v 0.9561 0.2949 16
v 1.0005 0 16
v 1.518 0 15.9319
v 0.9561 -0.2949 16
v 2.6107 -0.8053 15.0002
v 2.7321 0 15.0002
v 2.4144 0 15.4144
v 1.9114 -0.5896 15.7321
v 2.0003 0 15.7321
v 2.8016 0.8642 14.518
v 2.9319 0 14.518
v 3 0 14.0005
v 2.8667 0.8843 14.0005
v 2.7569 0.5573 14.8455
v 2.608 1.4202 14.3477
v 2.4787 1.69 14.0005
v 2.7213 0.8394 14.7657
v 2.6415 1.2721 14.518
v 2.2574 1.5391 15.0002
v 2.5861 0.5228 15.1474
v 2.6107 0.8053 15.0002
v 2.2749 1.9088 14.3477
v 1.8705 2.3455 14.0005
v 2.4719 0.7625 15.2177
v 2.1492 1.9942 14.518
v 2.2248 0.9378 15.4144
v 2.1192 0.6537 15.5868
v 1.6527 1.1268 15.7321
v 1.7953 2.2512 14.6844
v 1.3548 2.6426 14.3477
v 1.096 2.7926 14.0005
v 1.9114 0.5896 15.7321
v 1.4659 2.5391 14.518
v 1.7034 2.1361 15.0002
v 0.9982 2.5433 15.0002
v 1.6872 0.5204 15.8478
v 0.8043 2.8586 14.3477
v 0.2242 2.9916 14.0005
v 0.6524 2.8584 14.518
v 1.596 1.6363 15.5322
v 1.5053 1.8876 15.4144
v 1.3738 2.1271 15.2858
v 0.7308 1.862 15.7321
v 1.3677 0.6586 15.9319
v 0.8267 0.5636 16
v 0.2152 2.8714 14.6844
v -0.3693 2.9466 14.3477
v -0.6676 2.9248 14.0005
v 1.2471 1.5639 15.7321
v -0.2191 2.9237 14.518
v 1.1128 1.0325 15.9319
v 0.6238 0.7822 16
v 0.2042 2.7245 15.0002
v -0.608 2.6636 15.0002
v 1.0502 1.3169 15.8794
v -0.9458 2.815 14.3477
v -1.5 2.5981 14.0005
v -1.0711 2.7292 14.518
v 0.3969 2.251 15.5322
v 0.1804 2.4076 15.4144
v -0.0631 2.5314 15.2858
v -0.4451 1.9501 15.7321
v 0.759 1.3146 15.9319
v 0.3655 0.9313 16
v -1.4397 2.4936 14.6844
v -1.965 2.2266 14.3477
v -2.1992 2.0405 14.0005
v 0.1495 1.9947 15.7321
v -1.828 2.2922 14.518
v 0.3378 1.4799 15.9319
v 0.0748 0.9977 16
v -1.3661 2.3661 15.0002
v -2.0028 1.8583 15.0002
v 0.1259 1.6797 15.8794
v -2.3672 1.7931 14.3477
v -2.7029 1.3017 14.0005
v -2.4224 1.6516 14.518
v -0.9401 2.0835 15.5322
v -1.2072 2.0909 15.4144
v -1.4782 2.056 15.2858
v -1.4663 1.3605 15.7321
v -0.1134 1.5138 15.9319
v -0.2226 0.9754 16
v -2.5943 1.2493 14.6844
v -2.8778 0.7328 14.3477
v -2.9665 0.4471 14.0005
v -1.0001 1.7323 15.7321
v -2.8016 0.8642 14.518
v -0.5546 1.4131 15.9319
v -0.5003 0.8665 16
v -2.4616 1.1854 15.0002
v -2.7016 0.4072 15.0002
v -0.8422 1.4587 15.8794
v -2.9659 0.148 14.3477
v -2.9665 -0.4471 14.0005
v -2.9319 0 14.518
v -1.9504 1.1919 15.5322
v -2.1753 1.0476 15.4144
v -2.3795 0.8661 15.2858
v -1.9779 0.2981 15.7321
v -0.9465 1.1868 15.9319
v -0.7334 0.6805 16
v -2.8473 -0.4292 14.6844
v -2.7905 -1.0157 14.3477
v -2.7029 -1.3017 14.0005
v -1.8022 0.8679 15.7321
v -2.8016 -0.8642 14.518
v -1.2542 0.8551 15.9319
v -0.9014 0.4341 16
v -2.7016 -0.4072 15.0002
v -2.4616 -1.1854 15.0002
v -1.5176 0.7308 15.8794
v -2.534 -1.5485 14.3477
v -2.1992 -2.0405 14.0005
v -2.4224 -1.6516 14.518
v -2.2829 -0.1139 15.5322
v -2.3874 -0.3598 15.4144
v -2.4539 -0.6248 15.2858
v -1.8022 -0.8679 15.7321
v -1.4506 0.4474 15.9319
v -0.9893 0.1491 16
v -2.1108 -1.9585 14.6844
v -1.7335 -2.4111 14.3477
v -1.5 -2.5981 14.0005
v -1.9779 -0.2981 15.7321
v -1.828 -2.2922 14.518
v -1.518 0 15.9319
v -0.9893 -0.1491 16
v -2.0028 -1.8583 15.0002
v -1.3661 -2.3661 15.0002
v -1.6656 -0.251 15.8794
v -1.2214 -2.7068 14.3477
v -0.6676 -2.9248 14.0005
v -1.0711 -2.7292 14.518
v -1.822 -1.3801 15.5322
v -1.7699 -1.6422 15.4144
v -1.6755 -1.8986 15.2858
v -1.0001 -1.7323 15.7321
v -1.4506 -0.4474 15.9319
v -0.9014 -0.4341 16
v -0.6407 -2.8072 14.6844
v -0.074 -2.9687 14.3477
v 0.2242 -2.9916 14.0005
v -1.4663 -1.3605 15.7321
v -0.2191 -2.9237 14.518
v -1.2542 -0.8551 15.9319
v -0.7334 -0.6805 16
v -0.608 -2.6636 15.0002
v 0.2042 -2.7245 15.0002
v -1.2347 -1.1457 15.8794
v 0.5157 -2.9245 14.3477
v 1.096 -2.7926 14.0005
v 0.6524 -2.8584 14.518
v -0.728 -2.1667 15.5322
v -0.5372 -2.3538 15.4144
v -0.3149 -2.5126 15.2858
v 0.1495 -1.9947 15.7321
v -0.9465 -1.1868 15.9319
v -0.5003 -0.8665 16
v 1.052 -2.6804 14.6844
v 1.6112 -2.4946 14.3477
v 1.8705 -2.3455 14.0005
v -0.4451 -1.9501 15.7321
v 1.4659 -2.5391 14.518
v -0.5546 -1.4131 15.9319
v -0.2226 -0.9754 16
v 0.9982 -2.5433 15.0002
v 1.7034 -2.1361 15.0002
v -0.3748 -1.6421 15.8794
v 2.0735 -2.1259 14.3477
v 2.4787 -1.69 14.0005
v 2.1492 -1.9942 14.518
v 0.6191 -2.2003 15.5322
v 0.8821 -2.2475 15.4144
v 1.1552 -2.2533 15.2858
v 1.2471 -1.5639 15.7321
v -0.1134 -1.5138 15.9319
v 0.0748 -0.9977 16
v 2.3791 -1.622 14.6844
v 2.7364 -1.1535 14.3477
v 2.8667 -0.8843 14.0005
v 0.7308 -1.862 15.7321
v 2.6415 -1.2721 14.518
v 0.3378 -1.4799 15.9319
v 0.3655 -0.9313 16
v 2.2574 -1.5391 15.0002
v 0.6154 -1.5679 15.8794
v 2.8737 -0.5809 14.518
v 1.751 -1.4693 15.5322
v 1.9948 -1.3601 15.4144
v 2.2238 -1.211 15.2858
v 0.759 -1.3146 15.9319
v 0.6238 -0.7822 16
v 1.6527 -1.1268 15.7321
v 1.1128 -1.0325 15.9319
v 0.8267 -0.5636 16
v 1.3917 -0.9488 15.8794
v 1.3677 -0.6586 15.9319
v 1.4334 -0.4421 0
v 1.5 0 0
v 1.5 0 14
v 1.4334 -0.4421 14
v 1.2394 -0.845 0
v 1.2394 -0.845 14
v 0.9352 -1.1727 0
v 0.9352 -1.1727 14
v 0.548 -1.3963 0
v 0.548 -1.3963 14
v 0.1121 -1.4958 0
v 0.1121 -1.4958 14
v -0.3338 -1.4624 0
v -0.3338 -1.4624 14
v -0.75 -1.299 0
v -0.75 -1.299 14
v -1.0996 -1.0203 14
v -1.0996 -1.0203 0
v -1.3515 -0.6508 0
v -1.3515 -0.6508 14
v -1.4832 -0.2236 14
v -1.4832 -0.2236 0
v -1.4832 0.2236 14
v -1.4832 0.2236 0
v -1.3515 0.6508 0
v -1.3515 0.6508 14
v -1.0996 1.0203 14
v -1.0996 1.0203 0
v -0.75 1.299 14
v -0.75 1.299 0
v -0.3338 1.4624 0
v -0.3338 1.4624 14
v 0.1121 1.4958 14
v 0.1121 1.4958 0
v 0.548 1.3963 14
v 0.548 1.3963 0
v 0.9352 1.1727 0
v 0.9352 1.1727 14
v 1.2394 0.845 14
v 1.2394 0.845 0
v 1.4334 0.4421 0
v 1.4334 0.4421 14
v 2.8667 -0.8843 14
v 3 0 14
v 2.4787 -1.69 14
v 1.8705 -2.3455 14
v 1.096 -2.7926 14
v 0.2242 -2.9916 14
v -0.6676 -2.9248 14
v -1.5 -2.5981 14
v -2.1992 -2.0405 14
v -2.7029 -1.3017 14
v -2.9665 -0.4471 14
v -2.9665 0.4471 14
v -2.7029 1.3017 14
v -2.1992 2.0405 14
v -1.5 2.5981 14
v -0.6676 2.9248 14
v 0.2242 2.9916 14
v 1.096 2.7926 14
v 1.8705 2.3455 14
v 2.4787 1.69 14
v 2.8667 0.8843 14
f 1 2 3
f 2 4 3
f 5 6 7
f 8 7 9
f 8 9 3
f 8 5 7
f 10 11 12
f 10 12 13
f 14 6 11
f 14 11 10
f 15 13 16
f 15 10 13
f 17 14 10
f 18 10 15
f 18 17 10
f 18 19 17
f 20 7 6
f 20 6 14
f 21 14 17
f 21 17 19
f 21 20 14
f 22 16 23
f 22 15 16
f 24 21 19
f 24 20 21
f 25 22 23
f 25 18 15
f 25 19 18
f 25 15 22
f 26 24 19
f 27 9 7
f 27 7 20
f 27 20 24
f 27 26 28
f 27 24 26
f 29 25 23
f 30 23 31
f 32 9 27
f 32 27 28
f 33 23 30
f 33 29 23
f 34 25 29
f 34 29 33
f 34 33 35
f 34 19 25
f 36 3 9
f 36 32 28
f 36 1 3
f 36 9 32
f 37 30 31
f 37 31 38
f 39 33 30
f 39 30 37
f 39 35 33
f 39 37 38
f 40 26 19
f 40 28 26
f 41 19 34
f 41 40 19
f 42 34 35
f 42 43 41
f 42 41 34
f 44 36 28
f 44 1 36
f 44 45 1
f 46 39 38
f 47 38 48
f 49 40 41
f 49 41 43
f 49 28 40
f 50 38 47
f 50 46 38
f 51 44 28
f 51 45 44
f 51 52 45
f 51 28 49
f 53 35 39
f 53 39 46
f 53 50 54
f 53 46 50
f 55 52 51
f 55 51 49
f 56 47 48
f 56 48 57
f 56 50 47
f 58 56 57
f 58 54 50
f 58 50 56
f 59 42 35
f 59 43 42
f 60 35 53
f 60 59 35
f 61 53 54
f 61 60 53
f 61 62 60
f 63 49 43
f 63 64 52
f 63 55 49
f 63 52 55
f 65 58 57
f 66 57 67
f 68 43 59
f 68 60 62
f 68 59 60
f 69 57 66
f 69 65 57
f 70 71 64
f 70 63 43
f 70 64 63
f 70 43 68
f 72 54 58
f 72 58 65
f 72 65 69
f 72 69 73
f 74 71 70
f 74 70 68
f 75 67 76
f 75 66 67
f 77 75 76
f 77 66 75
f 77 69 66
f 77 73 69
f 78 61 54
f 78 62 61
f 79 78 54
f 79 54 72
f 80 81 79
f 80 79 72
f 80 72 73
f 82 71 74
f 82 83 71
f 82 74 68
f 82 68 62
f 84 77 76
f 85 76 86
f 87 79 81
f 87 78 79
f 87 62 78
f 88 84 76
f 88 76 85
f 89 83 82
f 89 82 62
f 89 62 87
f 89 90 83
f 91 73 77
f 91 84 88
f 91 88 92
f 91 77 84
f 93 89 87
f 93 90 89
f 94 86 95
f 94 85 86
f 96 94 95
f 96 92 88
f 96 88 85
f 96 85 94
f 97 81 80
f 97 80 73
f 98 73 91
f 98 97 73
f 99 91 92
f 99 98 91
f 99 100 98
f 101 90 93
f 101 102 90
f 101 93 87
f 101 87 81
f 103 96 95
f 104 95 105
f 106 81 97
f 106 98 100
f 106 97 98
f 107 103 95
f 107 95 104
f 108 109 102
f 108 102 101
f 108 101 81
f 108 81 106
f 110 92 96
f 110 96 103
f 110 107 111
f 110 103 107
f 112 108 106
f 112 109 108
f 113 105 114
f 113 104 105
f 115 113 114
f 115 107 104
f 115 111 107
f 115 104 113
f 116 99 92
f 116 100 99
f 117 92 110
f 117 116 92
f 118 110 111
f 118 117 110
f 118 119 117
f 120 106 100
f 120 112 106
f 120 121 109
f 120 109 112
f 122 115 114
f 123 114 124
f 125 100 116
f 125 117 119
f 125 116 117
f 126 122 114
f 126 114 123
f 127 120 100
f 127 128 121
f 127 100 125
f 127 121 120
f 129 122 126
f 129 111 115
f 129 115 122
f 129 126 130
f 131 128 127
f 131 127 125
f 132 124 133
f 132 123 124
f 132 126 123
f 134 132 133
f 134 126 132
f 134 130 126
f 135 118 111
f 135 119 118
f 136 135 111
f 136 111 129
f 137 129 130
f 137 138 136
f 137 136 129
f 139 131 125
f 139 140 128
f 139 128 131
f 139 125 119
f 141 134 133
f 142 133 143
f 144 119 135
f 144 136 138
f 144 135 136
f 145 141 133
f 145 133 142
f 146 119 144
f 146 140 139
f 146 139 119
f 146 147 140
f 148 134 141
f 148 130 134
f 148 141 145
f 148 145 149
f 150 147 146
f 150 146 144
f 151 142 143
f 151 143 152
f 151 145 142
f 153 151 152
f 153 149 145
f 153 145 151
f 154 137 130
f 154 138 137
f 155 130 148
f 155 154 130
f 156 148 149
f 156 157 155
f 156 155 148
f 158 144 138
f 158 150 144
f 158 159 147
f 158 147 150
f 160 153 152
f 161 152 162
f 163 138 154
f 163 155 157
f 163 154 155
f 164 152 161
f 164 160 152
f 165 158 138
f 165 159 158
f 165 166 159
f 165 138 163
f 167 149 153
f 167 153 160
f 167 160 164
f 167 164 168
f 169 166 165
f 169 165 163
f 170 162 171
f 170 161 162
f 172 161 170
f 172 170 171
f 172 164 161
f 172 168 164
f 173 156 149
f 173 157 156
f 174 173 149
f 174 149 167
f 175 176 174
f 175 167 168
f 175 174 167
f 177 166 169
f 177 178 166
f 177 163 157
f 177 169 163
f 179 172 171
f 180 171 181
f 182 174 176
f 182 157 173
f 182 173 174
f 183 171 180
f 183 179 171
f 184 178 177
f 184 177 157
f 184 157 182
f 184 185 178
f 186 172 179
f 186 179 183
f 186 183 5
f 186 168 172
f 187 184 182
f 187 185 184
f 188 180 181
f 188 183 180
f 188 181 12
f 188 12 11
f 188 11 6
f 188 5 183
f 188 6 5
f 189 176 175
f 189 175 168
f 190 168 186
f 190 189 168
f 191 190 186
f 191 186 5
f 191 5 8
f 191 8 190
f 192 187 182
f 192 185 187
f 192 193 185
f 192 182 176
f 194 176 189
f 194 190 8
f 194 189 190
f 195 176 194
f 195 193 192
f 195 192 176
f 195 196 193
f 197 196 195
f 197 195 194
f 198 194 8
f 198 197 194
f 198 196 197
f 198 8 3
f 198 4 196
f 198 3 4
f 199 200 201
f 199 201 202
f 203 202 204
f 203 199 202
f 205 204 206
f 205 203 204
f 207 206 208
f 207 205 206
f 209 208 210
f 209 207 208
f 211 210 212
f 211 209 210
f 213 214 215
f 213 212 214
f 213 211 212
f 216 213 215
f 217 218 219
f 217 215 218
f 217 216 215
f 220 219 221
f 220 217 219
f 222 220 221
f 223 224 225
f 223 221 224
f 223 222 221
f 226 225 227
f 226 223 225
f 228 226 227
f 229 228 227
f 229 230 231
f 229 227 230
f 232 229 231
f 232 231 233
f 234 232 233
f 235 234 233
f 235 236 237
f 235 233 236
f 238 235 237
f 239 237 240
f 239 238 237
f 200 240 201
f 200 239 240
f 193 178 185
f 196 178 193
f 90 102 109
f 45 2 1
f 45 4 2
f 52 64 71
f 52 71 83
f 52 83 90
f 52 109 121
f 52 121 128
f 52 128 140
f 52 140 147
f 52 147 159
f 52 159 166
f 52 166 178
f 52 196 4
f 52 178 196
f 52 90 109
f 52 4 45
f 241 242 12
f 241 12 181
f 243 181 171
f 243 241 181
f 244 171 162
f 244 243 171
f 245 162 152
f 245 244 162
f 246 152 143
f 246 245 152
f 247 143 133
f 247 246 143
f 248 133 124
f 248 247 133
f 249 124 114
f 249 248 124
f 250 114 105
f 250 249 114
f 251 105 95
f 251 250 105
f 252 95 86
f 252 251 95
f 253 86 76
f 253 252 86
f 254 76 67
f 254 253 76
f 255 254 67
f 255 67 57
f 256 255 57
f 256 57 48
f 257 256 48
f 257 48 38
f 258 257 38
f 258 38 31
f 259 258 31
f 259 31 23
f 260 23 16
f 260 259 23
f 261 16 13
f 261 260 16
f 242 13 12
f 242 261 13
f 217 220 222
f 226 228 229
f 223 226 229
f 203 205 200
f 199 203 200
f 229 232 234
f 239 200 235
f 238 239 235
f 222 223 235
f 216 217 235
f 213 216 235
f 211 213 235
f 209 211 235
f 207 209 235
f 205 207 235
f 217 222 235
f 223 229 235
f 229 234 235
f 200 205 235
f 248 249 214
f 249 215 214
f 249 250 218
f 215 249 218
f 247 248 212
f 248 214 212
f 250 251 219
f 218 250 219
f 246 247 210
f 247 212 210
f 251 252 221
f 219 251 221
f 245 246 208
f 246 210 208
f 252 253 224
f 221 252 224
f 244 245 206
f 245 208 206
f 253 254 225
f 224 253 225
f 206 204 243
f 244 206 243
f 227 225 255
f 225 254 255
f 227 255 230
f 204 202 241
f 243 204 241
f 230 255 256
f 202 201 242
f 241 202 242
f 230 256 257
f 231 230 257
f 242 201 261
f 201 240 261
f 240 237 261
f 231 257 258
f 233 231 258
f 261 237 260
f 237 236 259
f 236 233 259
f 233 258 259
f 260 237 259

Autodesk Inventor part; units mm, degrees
ref_plane "YZ Plane" through (0, 0, 0) normal (1, 0, 0) x (0, 1, 0)
ref_plane "XZ Plane" through (0, 0, 0) normal (0, 1, 0) x (-1, 0, 0)
ref_plane "XY Plane" through (0, 0, 0) normal (0, 0, 1) x (1, 0, 0)
sketch "スケッチ1" plane through (0, 0, 0) normal (0, 0, 1) x (1, 0, 0)
  circle A0 centre (0, 0) radius 1.5
  dimension "d0" = 3
extrude "押し出し1" add sketch "スケッチ1" along normal blind 14
sketch "スケッチ2" plane through (0, 0, 14) normal (0, 0, 1) x (1, 0, 0)
  circle A0 centre (0, 0) radius 1.5 projected
  circle A1 centre (0, 0) radius 3
  dimension "d3" = 6
extrude "押し出し2" add sketch "スケッチ2" along normal blind 2 contours A0 | A1
fillet "フィレット1" radius 2 1 edges at (-3, 0, 16)
properties part number "M3ボタンボルト14" material "鋼、高強度、低合金"
